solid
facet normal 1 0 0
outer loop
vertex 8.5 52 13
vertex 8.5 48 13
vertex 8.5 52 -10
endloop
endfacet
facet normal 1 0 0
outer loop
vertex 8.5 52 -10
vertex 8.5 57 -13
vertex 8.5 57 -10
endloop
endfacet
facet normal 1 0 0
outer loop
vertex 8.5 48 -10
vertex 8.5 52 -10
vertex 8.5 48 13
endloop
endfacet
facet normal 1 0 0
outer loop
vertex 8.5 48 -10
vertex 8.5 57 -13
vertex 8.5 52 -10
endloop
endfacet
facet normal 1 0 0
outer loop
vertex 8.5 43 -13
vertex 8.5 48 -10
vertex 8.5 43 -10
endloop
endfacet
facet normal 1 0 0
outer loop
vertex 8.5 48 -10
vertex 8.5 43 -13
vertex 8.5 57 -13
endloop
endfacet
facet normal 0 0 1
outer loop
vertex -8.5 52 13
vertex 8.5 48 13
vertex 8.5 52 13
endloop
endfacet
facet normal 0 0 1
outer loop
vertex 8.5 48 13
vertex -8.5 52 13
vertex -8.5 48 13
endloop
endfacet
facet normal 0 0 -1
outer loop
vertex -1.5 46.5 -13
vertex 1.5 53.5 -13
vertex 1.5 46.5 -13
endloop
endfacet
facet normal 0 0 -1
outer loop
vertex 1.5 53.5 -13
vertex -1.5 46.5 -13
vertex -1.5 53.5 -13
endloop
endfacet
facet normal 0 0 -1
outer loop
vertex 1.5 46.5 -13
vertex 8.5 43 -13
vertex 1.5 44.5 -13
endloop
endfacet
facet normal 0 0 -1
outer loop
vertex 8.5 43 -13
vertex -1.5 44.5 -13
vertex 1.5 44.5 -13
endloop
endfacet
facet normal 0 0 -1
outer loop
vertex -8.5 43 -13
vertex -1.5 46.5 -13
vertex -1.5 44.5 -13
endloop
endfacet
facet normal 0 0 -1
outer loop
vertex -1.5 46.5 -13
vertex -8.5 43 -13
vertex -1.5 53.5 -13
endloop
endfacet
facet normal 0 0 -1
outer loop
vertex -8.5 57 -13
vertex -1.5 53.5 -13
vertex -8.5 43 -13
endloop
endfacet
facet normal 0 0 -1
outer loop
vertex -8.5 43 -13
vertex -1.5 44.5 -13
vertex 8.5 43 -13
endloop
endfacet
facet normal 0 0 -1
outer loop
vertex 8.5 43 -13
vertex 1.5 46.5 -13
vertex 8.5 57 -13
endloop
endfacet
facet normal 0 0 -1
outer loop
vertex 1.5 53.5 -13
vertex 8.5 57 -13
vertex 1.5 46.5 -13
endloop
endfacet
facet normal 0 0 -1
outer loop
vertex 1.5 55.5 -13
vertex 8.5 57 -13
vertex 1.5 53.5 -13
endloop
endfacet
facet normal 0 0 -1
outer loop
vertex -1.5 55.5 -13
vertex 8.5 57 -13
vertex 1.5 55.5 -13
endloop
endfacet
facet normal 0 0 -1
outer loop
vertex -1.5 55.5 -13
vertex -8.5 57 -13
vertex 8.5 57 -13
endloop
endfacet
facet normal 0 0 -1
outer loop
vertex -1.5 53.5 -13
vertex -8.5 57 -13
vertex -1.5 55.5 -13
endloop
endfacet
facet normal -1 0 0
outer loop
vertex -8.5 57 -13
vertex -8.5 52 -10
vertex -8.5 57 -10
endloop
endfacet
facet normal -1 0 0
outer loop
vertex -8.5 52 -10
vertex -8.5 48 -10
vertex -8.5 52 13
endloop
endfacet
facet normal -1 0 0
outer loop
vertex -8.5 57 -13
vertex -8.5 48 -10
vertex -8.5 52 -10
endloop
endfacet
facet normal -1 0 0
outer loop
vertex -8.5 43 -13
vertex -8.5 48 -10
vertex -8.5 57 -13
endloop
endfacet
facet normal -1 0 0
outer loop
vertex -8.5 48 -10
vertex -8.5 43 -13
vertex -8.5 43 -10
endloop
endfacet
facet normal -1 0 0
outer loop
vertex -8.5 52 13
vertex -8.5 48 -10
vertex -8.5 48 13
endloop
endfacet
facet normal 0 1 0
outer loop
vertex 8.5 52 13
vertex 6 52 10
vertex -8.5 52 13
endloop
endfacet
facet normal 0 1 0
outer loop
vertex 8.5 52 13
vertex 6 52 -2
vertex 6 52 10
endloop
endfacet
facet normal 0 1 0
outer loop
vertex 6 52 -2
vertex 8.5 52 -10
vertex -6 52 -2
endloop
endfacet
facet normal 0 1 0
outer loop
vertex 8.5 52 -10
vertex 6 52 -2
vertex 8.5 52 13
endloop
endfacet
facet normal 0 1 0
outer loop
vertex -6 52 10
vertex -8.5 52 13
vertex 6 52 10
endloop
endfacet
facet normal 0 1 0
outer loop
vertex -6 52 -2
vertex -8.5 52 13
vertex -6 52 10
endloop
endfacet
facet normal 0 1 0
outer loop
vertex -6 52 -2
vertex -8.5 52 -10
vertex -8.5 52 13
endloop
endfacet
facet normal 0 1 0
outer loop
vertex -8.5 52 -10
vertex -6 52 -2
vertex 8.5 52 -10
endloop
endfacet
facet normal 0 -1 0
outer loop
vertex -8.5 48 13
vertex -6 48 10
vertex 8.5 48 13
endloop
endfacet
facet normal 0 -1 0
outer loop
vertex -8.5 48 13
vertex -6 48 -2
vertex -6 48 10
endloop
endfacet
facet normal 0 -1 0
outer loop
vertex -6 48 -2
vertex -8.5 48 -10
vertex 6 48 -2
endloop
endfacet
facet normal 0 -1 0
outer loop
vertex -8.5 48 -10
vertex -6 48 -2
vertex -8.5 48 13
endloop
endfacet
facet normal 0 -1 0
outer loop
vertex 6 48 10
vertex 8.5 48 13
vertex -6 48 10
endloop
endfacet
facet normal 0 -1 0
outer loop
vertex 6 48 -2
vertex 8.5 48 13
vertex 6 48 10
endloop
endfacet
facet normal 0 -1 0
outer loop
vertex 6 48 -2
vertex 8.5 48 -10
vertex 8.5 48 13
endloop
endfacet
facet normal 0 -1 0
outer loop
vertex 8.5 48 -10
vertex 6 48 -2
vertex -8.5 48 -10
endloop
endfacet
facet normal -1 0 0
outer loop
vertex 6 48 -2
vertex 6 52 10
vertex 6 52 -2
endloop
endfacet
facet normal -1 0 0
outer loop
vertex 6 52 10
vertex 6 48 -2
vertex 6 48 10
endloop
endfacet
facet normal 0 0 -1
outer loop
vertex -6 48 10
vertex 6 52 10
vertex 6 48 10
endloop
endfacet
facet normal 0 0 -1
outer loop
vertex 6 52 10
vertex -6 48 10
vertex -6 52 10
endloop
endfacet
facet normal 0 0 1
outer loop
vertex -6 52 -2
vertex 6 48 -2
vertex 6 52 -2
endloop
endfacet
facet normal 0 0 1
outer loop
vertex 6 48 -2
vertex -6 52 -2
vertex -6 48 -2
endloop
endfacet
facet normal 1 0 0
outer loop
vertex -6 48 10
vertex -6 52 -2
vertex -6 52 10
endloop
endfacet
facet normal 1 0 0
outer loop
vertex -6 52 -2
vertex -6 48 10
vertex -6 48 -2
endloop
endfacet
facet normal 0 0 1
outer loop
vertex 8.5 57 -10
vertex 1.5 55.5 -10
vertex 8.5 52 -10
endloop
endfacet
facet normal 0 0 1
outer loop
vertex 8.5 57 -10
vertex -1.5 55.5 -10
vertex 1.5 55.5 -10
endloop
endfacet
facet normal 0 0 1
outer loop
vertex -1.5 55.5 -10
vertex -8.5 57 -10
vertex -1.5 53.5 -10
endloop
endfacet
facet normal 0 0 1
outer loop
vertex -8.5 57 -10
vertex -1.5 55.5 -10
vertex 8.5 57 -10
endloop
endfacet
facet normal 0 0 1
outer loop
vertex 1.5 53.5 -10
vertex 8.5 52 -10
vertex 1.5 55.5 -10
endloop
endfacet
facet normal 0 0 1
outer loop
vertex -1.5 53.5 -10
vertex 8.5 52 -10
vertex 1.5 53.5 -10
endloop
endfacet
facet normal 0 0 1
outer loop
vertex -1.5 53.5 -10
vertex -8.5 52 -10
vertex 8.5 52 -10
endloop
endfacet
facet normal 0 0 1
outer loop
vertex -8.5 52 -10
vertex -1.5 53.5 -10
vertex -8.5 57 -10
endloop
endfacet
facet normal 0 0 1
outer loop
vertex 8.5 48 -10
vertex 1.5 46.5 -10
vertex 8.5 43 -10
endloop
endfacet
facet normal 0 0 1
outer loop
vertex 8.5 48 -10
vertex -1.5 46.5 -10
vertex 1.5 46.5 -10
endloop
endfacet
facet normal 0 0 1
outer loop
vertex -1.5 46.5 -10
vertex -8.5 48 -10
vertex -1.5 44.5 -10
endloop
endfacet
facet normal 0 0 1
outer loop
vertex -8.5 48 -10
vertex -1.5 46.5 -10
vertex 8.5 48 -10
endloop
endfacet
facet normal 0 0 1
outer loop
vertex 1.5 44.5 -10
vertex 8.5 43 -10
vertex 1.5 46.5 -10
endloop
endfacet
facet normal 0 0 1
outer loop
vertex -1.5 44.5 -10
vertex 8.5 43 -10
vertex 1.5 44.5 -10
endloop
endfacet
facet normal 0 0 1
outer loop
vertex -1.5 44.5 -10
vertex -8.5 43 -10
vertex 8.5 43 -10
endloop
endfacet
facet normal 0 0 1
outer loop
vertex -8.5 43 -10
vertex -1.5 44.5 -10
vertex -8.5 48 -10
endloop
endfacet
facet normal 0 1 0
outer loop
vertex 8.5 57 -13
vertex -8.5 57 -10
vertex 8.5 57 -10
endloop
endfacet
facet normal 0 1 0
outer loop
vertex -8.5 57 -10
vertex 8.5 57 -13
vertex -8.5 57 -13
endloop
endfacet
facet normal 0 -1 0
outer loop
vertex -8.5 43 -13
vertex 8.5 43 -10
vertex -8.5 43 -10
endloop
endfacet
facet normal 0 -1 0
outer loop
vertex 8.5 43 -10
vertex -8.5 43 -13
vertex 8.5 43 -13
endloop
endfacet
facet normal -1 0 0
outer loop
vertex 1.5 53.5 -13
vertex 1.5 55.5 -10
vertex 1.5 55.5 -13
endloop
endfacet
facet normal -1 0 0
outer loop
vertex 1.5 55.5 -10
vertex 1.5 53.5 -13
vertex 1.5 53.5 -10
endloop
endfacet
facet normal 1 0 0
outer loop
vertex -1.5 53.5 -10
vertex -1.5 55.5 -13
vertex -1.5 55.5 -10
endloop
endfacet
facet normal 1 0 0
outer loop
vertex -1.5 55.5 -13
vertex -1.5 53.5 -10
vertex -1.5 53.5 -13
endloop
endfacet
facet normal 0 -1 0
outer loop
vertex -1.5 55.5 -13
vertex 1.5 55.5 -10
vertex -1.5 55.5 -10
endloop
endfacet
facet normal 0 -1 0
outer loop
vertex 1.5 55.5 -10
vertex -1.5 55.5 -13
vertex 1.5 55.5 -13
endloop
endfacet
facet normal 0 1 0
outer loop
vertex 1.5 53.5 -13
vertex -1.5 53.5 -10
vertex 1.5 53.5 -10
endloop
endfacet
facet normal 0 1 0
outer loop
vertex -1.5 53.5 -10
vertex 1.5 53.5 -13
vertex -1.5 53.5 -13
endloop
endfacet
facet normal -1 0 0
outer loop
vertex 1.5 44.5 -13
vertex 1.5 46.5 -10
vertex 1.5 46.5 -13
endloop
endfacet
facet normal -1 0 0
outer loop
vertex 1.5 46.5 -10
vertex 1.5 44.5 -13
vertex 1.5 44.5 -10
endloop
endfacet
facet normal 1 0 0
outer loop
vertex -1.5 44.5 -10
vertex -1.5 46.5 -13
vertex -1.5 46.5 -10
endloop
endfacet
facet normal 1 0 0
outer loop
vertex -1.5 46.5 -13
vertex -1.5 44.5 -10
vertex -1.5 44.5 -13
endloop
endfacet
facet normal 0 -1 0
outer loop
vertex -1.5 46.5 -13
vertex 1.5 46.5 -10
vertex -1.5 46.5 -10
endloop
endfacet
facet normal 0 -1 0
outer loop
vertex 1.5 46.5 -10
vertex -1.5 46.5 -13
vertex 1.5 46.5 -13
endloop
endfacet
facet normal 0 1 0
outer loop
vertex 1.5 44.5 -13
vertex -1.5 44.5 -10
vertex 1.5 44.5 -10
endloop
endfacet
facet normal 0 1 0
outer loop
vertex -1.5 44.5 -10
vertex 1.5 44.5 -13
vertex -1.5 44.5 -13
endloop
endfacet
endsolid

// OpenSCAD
$fn=70;
//house:7x2.5x4cm

//difference(){
//main();
////    cube([30,30,10], center=true);
//}

////box part and base
//difference()
//{
//    union(){
////        box();
////        translate([0,0,20]) box();
////        translate([0,0,40]) box();
//        
//        base(); 
//        
//    }
//         for(i=[0:2])
//        translate([-15,11,-1.5+i*20]) 
//        cube([30,2,3]); //middle con cut 
//}


//base support
//    difference(){
//    translate([-15, 14.5, 4+20])  
//        cube([30,2,7]);    
//      translate([10.5, 14, 6+20])  
//             cube([2,5,3]);    
//        
//        translate([-13, 14, 6+20])  
//             cube([2,5,3]);
//     }
  


////the connector
////translate([-11,11,-1.5+20]) 
////cube([22,2-0.8,3-0.5]); //middle con cut

//difference(){
//nano_box();
//translate([5,0,0])
//cube([40,10,24], center=true);
//}

translate([ 0,50,0]) button();
module button(){
    
    difference(){
    cube([17,4,26], center=true);
        translate([0,0,4])
        cube([12, 5,12], center=true);
    }
    translate([0,0,-11.5])
    difference(){
    cube([17,14,3],center=true);
        translate([0,4.5,0])
        cube([3,2,5], center=true);
        
        translate([0,-4.5,0])
        cube([3,2,5], center=true);
    }
}

module nano_box(){
    
    difference(){
    cube([48,6,22], center=true);
        translate([0,3,0])
         cube([44,8,17.8], center=true);
    }
    
    
//    translate([0,5,-2])
//    cube([44,2,4]);
    
    
//    cube([3,18,2]);
//    
//    cube([44,3,2]);
//    translate([2,1.5,-3])
//        cylinder(d=1.2,h=5);
//    translate([2+40.7,1.5,-3])
//        cylinder(d=1.2,h=5);
//    
//     translate([2 ,1.5+15,-3])
//        cylinder(d=1.2,h=5);
    
}


module base(){
    difference()
    {
     union(){
    translate([0, 16, 18])
    cube([21, 3,60], center=true);   //long base
    
      
         
        for(i=[0,10,20]) 
      translate([0,0,12.5-i*2]){
    difference(){
    translate([10, 14.5, 4+20])   //left butterfly
        cube([6,3,7]);    
      translate([12.5, 14, 6+20])  
             cube([2,5,3]);    
     }
   difference(){
    translate([-16.5 , 14.5, 4+20])   //right butterfly
        cube([6,3,7]);    
      translate([-15, 14, 6+20])  
             cube([2,5,3]);    
     }
    }     
   
    
     for(i=[0:2])
    translate([0,0,20*i]) {
    translate([7.7, 9, -3.5])   //left side con
    cube([3,6.5,7]);
     translate([5, 9, -3.5+6.2])   //left side exp
    cube([5.5,6,2]);  
     translate([-5-5.5, 9, -3.5+6.2])   //right side exp
    cube([5.5,6,2]);  
    translate([-7.7-3, 9, -3.5])  //right side con
    cube([3,6.5,7]);
    }
 

     }
      
     
     { //two box hole conn.
     translate([-3, 16, -9])
    cube([3, 8,2], center=true); //space cut for wire.
     translate([3, 16, -9])
    cube([3, 8,2], center=true); //space cut for wire.
     }
     
     for(i=[0:2])
      translate([0, 16, 7+i*20])
        cube([10, 8,12], center=true); //space cut for wire.
 }
 
    for(i=[0:2])
        translate([-10,12,-5.3+i*20]) 
            cube([20,3,2]); //middle conn
 
 
}

module main() {
upper();
lower();
outer();


n2 = 77; //teeth 
 
mm_per_tooth = 1; 
thickness    = 11;
hole         = 10; 

 
translate([0,0, -2.5])
gear(mm_per_tooth,n2,thickness,hole,0,168);

outer_rim_d=24;   //will be 24
translate([0,0, 3])
difference(){
cylinder(d=outer_rim_d, h=10, center=true, $fn=100);
   cylinder(d=12, h=19, center=true, $fn=100);
     
}
}



module box(){
    //4, 13, 14
    difference()
    {
        translate([0,3,0])
    cube([15,16+7,6], center=true);
       union() {
        cube([12.6,13.6,8], center=true); //inner box
        translate([0,8,3])
       cube([12.6,24,6], center=true); //half cut
        }
        
        
//        translate([-10,13,-1.5]) {
//        cube([30,2,3]);
//        }
    }
    
    
//    translate([0,1,0]) 
//    difference()
//    {
//    translate([0,13.5,-4]) 
//    cube([15,5,8], center=true); //half cut
//        
//        translate([0,12,-4]) 
//    cube([12,5,12], center=true); //half cut
//        
//          
//        translate([-10,12.5,-6]) {
//        cube([20,2,3]);
//        }
//    }
    
}
module upper() {
    difference() {
    cylinder(r=5, h=5, center=true);
        cylinder(r=3.2, h=6, center=true, $fn=100);
    }

    translate([0,3,-0.5])
    cube([6,2,4], center=true);
}

module lower() { 
    translate([0,0, 4])
    difference() {
    cylinder(d=9, h=4, center=true);
        cylinder(d=7.5, h=6, center=true, $fn=100);
    }   
}

module outer(){
    difference() {
        translate([0,0,3])
    cylinder(d=12, h=11, center=true);
        cylinder(d=7.75, h=26, center=true, $fn=100);
    }
}


//////////////////////////////////////////////////////////////////////////////////////////////
// Public Domain Parametric Involute Spur Gear (and involute helical gear and involute rack)
// version 1.1
// by Leemon Baird, 2011, Leemon@Leemon.com
//http://www.thingiverse.com/thing:5505
//
// This file is public domain.  Use it for any purpose, including commercial
// applications.  Attribution would be nice, but is not required.  There is
// no warranty of any kind, including its correctness, usefulness, or safety.
// 
// This is parameterized involute spur (or helical) gear.  It is much simpler and less powerful than
// others on Thingiverse.  But it is public domain.  I implemented it from scratch from the 
// descriptions and equations on Wikipedia and the web, using Mathematica for calculations and testing,
// and I now release it into the public domain.
//
//		http://en.wikipedia.org/wiki/Involute_gear
//		http://en.wikipedia.org/wiki/Gear
//		http://en.wikipedia.org/wiki/List_of_gear_nomenclature
//		http://gtrebaol.free.fr/doc/catia/spur_gear.html
//		http://www.cs.cmu.edu/~rapidproto/mechanisms/chpt7.html
//
// The module gear() gives an involute spur gear, with reasonable defaults for all the parameters.
// Normally, you should just choose the first 4 parameters, and let the rest be default values.
// The module gear() gives a gear in the XY plane, centered on the origin, with one tooth centered on
// the positive Y axis.  The various functions below it take the same parameters, and return various
// measurements for the gear.  The most important is pitch_radius, which tells how far apart to space
// gears that are meshing, and adendum_radius, which gives the size of the region filled by the gear.
// A gear has a "pitch circle", which is an invisible circle that cuts through the middle of each
// tooth (though not the exact center). In order for two gears to mesh, their pitch circles should 
// just touch.  So the distance between their centers should be pitch_radius() for one, plus pitch_radius() 
// for the other, which gives the radii of their pitch circles.
//
// In order for two gears to mesh, they must have the same mm_per_tooth and pressure_angle parameters.  
// mm_per_tooth gives the number of millimeters of arc around the pitch circle covered by one tooth and one
// space between teeth.  The pitch angle controls how flat or bulged the sides of the teeth are.  Common
// values include 14.5 degrees and 20 degrees, and occasionally 25.  Though I've seen 28 recommended for
// plastic gears. Larger numbers bulge out more, giving stronger teeth, so 28 degrees is the default here.
//
// The ratio of number_of_teeth for two meshing gears gives how many times one will make a full 
// revolution when the the other makes one full revolution.  If the two numbers are coprime (i.e. 
// are not both divisible by the same number greater than 1), then every tooth on one gear
// will meet every tooth on the other, for more even wear.  So coprime numbers of teeth are good.
//
// The module rack() gives a rack, which is a bar with teeth.  A rack can mesh with any
// gear that has the same mm_per_tooth and pressure_angle.
//
// Some terminology: 
// The outline of a gear is a smooth circle (the "pitch circle") which has mountains and valleys
// added so it is toothed.  So there is an inner circle (the "root circle") that touches the 
// base of all the teeth, an outer circle that touches the tips of all the teeth,
// and the invisible pitch circle in between them.  There is also a "base circle", which can be smaller than
// all three of the others, which controls the shape of the teeth.  The side of each tooth lies on the path 
// that the end of a string would follow if it were wrapped tightly around the base circle, then slowly unwound.  
// That shape is an "involute", which gives this type of gear its name.
//
//////////////////////////////////////////////////////////////////////////////////////////////

//An involute spur gear, with reasonable defaults for all the parameters.
//Normally, you should just choose the first 4 parameters, and let the rest be default values.
//Meshing gears must match in mm_per_tooth, pressure_angle, and twist,
//and be separated by the sum of their pitch radii, which can be found with pitch_radius().
module gear (
	mm_per_tooth    = 3,    //this is the "circular pitch", the circumference of the pitch circle divided by the number of teeth
	number_of_teeth = 11,   //total number of teeth around the entire perimeter
	thickness       = 6,    //thickness of gear in mm
	hole_diameter   = 3,    //diameter of the hole in the center, in mm
	twist           = 0,    //teeth rotate this many degrees from bottom of gear to top.  360 makes the gear a screw with each thread going around once
	teeth_to_hide   = 0,    //number of teeth to delete to make this only a fraction of a circle
	pressure_angle  = 28,   //Controls how straight or bulged the tooth sides are. In degrees.
	clearance       = 0.0,  //gap between top of a tooth on one gear and bottom of valley on a meshing gear (in millimeters)
	backlash        = 0.0,   //gap between two meshing teeth, in the direction along the circumference of the pitch circle
    center = false,   // center gear by z axis
    $fn = 20   // number of fragments to draw hole cylinder
) {
	p  = mm_per_tooth * number_of_teeth / PI / 2;  //radius of pitch circle
	c  = p + mm_per_tooth / PI - clearance;        //radius of outer circle
	b  = p*cos(pressure_angle);                    //radius of base circle
	r  = p-(c-p)-clearance;                        //radius of root circle
	t  = mm_per_tooth/2-backlash/2;                //tooth thickness at pitch circle
	k  = -iang(b, p) - t/2/p/PI*180;             //angle to where involute meets base circle on each side of tooth
    difference() {
        for (i = [0:(number_of_teeth-teeth_to_hide-1 > 0 ? 1 : -1):number_of_teeth-teeth_to_hide-1] )
            rotate([0,0,i*360/number_of_teeth])
                linear_extrude(height = thickness, center = center, convexity = 10, twist = twist)
                    polygon(
                        points=[
                            [0, -hole_diameter/10],
                            polar(r, -181/number_of_teeth),
                            polar(r, r<b ? k : -180/number_of_teeth),
                            q7(0/5,r,b,c,k, 1),q7(1/5,r,b,c,k, 1),q7(2/5,r,b,c,k, 1),q7(3/5,r,b,c,k, 1),q7(4/5,r,b,c,k, 1),q7(5/5,r,b,c,k, 1),
                            q7(5/5,r,b,c,k,-1),q7(4/5,r,b,c,k,-1),q7(3/5,r,b,c,k,-1),q7(2/5,r,b,c,k,-1),q7(1/5,r,b,c,k,-1),q7(0/5,r,b,c,k,-1),
                            polar(r, r<b ? -k : 180/number_of_teeth),
                            polar(r, 181/number_of_teeth)
                        ],
                        paths=[[0,1,2,3,4,5,6,7,8,9,10,11,12,13,14,15,16]]
                    );
//        translate([0,0, (center ? 0 : -0.1)])
            cylinder(h=thickness+0.2, r=hole_diameter/2, center=center, $fn=$fn);
    }
};	
//these 4 functions are used by gear
function polar(r,theta)   = r*[sin(theta), cos(theta)];                            //convert polar to cartesian coordinates
function iang(r1,r2)      = sqrt((r2/r1)*(r2/r1) - 1)/PI*180 - acos(r1/r2); //unwind a string this many degrees to go from radius r1 to radius r2
function q7(f,r,b,r2,t,s) = q6(b,s,t,(1-f)*max(b,r)+f*r2);                         //radius a fraction f up the curved side of the tooth 
function q6(b,s,t,d)      = polar(d,s*(iang(b,d)+t));                              //point at radius d on the involute curve
 

//These 5 functions let the user find the derived dimensions of the gear.
//A gear fits within a circle of radius outer_radius, and two gears should have
//their centers separated by the sum of their pictch_radius.
function circular_pitch  (mm_per_tooth=3) = mm_per_tooth;                     //tooth density expressed as "circular pitch" in millimeters
function diametral_pitch (mm_per_tooth=3) = PI / mm_per_tooth;         //tooth density expressed as "diametral pitch" in teeth per millimeter
function module_value    (mm_per_tooth=3) = mm_per_tooth / PI;                //tooth density expressed as "module" or "modulus" in millimeters
function pitch_radius    (mm_per_tooth=3,number_of_teeth=11) = mm_per_tooth * number_of_teeth / PI / 2;
function outer_radius    (mm_per_tooth=3,number_of_teeth=11,clearance=0.1)    //The gear fits entirely within a cylinder of this radius.
	= mm_per_tooth*(1+number_of_teeth/2)/PI  - clearance;              

 
